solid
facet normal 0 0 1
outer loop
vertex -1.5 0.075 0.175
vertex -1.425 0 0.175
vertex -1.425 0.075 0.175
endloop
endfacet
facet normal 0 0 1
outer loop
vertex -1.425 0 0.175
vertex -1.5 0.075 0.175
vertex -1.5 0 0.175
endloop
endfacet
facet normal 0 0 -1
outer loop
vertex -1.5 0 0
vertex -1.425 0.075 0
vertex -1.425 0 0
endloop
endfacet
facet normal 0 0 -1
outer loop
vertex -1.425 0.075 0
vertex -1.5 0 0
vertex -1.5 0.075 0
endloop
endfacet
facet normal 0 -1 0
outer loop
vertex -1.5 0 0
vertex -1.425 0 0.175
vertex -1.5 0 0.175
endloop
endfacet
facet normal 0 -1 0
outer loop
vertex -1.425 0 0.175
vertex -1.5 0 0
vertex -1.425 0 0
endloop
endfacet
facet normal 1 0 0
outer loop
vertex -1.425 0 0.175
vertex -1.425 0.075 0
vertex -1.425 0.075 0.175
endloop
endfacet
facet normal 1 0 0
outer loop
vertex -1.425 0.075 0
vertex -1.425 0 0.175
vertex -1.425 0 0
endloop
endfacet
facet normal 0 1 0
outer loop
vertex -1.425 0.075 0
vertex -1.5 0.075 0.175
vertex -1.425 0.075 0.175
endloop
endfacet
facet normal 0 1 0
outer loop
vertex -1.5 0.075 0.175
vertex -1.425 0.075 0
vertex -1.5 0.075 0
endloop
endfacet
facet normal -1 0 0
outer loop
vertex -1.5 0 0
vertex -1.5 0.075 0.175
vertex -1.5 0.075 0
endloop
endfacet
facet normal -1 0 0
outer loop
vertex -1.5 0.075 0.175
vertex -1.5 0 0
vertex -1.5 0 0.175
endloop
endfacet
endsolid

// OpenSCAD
union() {
  difference() {
    linear_extrude(height = 0.175, center = false, convexity = 10, slices = 10)
       import(file = "FlangeAOutline2.dxf");

    // cut center hole
    cylinder (h = 1.0, d=3.000, center=true, $fn = 250);

    // cut panel mounting holes
    translate([1.25, 1.25, 0])
       cylinder(h = 1.0, d = 0.188, center = true, $fn = 40);
    translate([-1.25, 1.25, 0])
       cylinder(h = 1.0, d = 0.188, center = true, $fn = 40);
    translate([1.25, -1.25, 0])
       cylinder(h = 1.0, d = 0.188, center = true, $fn = 40);
    translate([-1.25, -1.25, 0])
       cylinder(h = 1.0, d = 0.188, center = true, $fn = 40);

    // assembly screw holes
    translate([1, 2.75/2, 0])
       cylinder(h = 0.5, d = 0.125, center = true, $fn = 40);
    translate([-1, 2.75/2, 0])
       cylinder(h = 0.5, d = 0.125, center = true, $fn = 40);
    translate([1, -2.75/2, 0])
       cylinder(h = 0.5, d = 0.125, center = true, $fn = 40);
    translate([-1, -2.75/2, 0])
       cylinder(h = 0.5, d = 0.125, center = true, $fn = 40);
    translate([2.75/2, 1, 0])
       cylinder(h = 0.5, d = 0.125, center = true, $fn = 40);
    translate([-2.75/2, 1, 0])
       cylinder(h = 0.5, d = 0.125, center = true, $fn = 40);
    translate([2.75/2, -1, 0])
       cylinder(h = 0.5, d = 0.125, center = true, $fn = 40);
    translate([-2.75/2, -1, 0])
       cylinder(h = 0.5, d = 0.125, center = true, $fn = 40);
  }

  // Add faceplate key (for notch)
  translate([-1.5, 0, 0])
     cube([0.075, 0.075, 0.175]);
}
